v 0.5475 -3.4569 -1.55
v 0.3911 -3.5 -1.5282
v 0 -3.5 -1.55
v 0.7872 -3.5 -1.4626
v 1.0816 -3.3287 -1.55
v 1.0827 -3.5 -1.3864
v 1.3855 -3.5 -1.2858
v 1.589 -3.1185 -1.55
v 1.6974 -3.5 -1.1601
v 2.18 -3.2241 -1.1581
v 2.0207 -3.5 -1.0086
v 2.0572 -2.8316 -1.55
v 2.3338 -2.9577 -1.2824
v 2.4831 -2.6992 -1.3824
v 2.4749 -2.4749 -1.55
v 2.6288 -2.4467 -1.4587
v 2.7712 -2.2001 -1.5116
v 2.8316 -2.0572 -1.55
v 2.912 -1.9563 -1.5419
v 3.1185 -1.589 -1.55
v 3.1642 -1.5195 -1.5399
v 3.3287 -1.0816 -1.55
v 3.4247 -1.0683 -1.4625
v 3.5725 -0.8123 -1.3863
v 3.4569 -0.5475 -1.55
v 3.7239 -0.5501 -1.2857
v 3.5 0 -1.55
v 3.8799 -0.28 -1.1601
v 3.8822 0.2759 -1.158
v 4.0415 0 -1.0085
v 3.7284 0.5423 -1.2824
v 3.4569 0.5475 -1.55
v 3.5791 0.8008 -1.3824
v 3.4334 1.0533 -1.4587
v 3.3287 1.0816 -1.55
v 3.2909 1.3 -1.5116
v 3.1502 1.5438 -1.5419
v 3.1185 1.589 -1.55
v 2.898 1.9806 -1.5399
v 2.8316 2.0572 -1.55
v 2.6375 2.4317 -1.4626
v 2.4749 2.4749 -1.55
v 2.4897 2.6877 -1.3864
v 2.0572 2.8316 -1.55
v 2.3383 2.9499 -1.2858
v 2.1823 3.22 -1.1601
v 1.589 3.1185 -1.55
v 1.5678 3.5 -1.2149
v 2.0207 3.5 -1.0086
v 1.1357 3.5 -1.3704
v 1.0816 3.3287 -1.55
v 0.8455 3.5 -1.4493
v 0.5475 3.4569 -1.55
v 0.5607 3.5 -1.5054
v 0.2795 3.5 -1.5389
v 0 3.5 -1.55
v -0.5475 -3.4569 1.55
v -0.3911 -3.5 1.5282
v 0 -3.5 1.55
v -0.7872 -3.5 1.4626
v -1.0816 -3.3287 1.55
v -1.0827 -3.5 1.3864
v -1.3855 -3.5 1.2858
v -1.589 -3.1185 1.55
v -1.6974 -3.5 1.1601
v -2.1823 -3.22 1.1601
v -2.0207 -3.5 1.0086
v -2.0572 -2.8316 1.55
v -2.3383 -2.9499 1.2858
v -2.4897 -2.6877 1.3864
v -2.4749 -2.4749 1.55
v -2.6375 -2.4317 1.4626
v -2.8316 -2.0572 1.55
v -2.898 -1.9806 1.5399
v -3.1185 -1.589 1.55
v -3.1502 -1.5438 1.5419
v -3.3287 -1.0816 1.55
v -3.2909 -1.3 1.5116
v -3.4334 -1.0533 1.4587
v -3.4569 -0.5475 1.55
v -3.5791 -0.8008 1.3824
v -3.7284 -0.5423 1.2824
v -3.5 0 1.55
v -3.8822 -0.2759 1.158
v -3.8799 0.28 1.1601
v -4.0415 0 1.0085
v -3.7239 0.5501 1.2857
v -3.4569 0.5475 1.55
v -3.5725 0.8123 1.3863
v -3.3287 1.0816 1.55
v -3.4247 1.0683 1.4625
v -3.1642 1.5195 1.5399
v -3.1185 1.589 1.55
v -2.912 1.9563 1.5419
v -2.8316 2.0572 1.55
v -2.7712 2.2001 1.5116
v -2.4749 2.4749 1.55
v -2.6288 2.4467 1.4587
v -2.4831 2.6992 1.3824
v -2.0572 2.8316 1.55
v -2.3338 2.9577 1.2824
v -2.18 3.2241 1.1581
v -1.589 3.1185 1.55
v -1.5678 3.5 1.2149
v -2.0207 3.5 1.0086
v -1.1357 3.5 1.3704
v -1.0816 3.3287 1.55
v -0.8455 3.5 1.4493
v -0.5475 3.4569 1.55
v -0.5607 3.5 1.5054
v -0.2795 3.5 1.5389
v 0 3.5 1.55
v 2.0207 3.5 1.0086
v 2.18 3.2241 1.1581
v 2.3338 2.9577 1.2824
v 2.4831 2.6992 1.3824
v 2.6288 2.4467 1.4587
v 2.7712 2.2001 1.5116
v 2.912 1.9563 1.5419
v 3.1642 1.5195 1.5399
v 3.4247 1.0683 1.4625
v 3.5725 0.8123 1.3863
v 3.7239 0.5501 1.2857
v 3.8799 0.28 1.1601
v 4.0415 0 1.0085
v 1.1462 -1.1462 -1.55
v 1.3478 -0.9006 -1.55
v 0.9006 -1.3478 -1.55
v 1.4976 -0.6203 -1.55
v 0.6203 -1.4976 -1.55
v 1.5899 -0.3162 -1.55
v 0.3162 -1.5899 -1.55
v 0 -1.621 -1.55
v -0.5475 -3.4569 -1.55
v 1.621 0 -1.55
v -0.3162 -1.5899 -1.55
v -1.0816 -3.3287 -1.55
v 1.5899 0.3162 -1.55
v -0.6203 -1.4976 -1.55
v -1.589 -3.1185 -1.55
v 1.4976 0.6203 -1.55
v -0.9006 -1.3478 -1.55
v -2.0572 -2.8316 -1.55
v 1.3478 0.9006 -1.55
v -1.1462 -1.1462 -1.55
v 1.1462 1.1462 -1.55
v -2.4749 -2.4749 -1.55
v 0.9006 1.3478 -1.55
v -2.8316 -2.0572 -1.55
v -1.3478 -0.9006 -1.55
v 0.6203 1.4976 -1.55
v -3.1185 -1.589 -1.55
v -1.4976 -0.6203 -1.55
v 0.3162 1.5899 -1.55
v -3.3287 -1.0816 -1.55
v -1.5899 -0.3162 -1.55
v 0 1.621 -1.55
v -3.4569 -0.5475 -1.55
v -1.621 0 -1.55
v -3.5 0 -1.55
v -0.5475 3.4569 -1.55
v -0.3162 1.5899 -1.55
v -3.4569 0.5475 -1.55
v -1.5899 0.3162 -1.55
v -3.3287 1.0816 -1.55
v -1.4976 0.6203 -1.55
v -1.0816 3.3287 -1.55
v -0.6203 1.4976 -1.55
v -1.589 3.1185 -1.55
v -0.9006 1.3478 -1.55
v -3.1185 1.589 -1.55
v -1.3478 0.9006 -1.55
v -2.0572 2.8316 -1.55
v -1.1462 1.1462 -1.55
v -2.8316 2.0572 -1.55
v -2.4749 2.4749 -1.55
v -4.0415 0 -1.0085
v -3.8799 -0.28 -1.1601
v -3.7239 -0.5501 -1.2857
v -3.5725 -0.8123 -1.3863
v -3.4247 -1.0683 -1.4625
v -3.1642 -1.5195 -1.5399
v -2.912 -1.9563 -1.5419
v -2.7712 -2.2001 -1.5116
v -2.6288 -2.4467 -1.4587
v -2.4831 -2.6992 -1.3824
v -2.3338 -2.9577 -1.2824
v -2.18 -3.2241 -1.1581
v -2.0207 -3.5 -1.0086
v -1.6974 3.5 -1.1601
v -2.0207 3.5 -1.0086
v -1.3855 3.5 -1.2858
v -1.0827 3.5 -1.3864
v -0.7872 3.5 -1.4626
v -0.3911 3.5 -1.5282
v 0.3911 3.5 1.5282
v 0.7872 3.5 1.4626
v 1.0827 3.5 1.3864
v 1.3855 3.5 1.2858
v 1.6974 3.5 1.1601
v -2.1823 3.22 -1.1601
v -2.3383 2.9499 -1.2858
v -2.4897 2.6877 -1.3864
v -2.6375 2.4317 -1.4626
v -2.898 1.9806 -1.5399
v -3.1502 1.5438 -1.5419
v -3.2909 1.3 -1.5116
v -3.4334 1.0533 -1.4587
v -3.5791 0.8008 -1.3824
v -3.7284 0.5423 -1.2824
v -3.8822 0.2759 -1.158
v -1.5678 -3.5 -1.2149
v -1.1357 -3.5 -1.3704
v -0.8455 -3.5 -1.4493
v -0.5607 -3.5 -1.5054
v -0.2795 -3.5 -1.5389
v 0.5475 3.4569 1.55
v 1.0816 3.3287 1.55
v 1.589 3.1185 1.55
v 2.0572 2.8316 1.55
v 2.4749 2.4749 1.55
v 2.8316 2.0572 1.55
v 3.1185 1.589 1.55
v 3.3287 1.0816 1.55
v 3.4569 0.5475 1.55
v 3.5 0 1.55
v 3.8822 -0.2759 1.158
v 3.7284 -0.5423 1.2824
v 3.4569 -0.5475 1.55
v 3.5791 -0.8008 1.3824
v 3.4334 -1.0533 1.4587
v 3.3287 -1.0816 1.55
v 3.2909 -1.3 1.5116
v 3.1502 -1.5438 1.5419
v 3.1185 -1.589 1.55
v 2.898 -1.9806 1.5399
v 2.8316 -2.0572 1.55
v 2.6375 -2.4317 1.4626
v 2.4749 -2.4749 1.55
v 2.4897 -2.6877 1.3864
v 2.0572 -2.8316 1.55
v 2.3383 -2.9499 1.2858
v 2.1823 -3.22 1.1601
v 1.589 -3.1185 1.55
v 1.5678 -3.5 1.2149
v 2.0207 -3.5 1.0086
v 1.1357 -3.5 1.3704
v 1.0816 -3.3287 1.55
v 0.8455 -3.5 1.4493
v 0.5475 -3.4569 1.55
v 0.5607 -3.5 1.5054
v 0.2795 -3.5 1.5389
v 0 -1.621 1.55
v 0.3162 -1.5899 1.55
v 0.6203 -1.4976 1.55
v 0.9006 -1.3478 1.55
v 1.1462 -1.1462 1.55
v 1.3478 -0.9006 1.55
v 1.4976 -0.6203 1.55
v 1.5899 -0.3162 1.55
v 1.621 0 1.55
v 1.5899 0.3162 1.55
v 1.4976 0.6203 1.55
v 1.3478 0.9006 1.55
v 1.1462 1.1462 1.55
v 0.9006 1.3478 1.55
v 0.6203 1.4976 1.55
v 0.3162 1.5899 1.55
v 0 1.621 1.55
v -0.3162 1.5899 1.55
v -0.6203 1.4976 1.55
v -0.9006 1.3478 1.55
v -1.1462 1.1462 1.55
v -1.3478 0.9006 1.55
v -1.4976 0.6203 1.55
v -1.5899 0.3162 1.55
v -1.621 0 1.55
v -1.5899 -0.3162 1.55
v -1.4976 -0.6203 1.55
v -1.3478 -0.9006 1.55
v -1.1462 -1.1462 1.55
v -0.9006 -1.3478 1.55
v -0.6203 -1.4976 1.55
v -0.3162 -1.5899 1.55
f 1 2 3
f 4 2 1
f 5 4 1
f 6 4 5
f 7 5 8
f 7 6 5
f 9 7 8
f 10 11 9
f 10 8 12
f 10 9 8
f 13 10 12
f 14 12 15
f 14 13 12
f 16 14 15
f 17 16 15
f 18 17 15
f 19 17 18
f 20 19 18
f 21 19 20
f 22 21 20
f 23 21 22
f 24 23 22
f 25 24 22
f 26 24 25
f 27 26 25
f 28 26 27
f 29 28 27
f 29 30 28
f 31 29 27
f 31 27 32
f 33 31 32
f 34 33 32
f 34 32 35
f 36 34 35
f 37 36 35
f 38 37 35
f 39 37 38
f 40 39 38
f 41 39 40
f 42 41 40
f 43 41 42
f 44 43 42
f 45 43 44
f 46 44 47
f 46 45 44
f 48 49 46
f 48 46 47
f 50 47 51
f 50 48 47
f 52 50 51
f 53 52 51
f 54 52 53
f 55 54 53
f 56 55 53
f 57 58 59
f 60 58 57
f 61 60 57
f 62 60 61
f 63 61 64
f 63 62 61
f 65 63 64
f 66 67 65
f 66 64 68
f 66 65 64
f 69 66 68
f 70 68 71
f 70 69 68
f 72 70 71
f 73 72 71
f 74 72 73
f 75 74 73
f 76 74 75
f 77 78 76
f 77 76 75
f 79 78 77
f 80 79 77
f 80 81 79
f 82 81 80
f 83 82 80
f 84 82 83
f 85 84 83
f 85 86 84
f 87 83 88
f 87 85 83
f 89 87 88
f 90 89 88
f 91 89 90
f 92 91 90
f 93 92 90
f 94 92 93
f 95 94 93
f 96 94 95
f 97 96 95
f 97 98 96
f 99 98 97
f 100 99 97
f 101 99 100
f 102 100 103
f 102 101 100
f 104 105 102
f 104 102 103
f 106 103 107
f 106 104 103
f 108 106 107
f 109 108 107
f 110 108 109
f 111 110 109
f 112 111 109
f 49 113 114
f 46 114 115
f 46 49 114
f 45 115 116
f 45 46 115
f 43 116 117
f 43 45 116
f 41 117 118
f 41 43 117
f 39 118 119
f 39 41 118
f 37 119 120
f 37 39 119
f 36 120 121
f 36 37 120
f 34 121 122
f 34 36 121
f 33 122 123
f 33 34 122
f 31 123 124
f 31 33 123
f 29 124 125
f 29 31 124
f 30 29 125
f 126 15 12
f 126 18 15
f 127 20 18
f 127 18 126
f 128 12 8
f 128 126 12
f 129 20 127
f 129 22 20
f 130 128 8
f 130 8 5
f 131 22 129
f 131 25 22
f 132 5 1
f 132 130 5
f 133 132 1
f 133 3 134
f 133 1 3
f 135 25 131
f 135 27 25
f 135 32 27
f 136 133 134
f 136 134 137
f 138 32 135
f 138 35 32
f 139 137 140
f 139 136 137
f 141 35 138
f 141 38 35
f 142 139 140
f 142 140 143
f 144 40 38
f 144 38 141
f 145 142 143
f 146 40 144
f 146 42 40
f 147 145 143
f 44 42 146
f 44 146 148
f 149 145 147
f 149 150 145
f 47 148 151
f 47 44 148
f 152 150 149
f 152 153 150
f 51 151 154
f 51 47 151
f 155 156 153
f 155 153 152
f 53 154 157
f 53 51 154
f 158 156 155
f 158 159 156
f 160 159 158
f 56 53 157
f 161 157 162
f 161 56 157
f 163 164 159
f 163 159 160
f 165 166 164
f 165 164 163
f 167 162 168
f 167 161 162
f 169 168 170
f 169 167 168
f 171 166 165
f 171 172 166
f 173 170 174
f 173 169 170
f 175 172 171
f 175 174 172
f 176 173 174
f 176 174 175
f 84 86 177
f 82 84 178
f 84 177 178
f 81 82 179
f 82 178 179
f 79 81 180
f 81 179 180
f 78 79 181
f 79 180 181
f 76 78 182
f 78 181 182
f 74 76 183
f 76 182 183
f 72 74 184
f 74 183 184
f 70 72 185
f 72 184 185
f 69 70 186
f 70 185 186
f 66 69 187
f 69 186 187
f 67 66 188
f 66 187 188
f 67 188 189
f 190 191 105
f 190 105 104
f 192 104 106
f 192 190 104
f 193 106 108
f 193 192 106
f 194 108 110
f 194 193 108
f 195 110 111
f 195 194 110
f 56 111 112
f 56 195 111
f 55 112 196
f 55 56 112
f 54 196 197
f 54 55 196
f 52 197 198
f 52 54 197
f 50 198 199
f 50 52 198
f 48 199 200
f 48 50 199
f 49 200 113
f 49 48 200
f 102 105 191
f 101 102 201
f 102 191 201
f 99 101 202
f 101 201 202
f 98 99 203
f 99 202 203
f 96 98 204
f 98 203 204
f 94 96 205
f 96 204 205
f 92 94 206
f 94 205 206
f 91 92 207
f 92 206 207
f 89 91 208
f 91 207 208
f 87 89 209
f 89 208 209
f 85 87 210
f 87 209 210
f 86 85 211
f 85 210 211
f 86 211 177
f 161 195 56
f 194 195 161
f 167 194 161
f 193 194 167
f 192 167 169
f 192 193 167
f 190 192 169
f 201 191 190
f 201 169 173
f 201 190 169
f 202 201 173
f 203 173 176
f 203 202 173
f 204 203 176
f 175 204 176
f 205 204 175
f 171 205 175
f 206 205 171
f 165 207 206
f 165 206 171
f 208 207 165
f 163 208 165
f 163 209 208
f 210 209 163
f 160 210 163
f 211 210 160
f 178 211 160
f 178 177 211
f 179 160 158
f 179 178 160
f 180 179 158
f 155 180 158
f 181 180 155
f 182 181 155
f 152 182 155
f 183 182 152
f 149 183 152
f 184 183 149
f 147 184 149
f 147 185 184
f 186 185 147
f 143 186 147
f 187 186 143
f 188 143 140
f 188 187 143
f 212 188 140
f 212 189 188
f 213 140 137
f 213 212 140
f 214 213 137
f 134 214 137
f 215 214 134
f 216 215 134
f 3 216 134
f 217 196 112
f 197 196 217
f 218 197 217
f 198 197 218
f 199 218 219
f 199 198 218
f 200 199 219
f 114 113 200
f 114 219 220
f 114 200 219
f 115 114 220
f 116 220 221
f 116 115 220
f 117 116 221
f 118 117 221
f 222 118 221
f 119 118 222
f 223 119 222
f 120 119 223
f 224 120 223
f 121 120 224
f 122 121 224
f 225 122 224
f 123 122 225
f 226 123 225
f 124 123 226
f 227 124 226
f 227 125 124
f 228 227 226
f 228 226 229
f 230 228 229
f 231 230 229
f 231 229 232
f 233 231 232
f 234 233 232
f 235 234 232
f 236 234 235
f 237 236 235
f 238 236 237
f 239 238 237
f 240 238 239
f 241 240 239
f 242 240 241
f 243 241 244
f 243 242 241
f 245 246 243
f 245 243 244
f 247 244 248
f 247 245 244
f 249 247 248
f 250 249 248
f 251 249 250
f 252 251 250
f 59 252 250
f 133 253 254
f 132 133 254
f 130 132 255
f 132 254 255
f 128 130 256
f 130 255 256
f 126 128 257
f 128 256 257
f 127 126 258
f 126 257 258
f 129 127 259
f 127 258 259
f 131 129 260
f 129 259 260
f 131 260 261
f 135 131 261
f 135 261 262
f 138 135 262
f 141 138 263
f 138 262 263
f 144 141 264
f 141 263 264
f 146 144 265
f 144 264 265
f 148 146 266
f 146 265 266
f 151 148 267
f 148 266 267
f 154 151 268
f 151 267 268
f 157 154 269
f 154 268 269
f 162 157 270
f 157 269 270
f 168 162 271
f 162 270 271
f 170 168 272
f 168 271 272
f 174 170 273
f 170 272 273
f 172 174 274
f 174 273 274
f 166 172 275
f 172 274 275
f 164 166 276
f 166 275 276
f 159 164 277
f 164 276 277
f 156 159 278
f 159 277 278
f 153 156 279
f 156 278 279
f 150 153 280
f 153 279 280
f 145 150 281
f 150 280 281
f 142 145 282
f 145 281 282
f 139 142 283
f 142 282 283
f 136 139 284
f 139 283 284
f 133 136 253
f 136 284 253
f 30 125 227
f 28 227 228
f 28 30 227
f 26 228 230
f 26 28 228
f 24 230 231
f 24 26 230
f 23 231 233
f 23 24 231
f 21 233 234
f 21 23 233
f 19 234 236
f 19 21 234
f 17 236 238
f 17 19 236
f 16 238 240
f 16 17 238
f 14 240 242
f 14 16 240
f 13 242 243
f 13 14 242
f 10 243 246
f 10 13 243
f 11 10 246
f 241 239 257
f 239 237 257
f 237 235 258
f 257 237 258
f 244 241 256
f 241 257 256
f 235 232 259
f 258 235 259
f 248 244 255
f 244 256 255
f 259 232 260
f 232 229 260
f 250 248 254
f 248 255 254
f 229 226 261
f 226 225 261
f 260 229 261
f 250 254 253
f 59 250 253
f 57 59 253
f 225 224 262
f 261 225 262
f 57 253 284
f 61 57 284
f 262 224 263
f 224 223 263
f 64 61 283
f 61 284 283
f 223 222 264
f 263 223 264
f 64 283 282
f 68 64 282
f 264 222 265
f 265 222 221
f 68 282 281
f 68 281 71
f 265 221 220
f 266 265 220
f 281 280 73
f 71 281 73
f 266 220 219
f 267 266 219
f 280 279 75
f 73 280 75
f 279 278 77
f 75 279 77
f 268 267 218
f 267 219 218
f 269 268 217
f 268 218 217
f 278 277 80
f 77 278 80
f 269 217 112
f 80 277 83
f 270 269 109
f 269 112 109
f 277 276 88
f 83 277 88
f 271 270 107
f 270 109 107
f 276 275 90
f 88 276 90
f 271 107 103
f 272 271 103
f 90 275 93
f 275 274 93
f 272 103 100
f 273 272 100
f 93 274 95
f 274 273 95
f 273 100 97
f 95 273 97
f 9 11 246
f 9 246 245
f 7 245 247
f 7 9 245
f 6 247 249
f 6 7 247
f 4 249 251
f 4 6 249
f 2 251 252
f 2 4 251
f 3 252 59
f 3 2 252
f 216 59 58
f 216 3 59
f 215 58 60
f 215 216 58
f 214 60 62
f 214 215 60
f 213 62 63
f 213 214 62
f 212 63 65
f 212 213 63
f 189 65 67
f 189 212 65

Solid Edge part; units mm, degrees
sketch "Sketch1" plane through (0, 0, 0) normal (0, 0, 1) x (1, 0, 0)
  line L0 (2.0207, -3.5) -> (-2.0207, -3.5)
  line L1 (-4.0415, 0) -> (-2.0207, -3.5)
  line L2 (-2.0207, 3.5) -> (-4.0415, 0)
  line L3 (-2.0207, 3.5) -> (2.0207, 3.5)
  line L4 (2.0207, 3.5) -> (4.0415, 0)
  line L5 (4.0415, 0) -> (2.0207, -3.5)
extrude "Protrusion1" add sketch "Sketch1" along normal mid plane 3.1
hole "Hole_1" at (0, 0, 1.55) direction (0, 0, -1) diameter 3.242 end through all
sketch "Sketch2" plane through (0, 0, 0) normal (1, 0, 0) x (0, 1, 0)
  line L0 (-3.5, 1.55) -> (-1.7885, 3.2615)
revolve "RevolvedCutout1" cut sketch "Sketch2" angle 360 about axis through (0, 0, -57) along (0, 0, 1) material side at (0, -2.6796, 2.4411)
mirror "Mirror1" about plane through (0, 0, 0) normal (0, 0, 1) of "RevolvedCutout1"
